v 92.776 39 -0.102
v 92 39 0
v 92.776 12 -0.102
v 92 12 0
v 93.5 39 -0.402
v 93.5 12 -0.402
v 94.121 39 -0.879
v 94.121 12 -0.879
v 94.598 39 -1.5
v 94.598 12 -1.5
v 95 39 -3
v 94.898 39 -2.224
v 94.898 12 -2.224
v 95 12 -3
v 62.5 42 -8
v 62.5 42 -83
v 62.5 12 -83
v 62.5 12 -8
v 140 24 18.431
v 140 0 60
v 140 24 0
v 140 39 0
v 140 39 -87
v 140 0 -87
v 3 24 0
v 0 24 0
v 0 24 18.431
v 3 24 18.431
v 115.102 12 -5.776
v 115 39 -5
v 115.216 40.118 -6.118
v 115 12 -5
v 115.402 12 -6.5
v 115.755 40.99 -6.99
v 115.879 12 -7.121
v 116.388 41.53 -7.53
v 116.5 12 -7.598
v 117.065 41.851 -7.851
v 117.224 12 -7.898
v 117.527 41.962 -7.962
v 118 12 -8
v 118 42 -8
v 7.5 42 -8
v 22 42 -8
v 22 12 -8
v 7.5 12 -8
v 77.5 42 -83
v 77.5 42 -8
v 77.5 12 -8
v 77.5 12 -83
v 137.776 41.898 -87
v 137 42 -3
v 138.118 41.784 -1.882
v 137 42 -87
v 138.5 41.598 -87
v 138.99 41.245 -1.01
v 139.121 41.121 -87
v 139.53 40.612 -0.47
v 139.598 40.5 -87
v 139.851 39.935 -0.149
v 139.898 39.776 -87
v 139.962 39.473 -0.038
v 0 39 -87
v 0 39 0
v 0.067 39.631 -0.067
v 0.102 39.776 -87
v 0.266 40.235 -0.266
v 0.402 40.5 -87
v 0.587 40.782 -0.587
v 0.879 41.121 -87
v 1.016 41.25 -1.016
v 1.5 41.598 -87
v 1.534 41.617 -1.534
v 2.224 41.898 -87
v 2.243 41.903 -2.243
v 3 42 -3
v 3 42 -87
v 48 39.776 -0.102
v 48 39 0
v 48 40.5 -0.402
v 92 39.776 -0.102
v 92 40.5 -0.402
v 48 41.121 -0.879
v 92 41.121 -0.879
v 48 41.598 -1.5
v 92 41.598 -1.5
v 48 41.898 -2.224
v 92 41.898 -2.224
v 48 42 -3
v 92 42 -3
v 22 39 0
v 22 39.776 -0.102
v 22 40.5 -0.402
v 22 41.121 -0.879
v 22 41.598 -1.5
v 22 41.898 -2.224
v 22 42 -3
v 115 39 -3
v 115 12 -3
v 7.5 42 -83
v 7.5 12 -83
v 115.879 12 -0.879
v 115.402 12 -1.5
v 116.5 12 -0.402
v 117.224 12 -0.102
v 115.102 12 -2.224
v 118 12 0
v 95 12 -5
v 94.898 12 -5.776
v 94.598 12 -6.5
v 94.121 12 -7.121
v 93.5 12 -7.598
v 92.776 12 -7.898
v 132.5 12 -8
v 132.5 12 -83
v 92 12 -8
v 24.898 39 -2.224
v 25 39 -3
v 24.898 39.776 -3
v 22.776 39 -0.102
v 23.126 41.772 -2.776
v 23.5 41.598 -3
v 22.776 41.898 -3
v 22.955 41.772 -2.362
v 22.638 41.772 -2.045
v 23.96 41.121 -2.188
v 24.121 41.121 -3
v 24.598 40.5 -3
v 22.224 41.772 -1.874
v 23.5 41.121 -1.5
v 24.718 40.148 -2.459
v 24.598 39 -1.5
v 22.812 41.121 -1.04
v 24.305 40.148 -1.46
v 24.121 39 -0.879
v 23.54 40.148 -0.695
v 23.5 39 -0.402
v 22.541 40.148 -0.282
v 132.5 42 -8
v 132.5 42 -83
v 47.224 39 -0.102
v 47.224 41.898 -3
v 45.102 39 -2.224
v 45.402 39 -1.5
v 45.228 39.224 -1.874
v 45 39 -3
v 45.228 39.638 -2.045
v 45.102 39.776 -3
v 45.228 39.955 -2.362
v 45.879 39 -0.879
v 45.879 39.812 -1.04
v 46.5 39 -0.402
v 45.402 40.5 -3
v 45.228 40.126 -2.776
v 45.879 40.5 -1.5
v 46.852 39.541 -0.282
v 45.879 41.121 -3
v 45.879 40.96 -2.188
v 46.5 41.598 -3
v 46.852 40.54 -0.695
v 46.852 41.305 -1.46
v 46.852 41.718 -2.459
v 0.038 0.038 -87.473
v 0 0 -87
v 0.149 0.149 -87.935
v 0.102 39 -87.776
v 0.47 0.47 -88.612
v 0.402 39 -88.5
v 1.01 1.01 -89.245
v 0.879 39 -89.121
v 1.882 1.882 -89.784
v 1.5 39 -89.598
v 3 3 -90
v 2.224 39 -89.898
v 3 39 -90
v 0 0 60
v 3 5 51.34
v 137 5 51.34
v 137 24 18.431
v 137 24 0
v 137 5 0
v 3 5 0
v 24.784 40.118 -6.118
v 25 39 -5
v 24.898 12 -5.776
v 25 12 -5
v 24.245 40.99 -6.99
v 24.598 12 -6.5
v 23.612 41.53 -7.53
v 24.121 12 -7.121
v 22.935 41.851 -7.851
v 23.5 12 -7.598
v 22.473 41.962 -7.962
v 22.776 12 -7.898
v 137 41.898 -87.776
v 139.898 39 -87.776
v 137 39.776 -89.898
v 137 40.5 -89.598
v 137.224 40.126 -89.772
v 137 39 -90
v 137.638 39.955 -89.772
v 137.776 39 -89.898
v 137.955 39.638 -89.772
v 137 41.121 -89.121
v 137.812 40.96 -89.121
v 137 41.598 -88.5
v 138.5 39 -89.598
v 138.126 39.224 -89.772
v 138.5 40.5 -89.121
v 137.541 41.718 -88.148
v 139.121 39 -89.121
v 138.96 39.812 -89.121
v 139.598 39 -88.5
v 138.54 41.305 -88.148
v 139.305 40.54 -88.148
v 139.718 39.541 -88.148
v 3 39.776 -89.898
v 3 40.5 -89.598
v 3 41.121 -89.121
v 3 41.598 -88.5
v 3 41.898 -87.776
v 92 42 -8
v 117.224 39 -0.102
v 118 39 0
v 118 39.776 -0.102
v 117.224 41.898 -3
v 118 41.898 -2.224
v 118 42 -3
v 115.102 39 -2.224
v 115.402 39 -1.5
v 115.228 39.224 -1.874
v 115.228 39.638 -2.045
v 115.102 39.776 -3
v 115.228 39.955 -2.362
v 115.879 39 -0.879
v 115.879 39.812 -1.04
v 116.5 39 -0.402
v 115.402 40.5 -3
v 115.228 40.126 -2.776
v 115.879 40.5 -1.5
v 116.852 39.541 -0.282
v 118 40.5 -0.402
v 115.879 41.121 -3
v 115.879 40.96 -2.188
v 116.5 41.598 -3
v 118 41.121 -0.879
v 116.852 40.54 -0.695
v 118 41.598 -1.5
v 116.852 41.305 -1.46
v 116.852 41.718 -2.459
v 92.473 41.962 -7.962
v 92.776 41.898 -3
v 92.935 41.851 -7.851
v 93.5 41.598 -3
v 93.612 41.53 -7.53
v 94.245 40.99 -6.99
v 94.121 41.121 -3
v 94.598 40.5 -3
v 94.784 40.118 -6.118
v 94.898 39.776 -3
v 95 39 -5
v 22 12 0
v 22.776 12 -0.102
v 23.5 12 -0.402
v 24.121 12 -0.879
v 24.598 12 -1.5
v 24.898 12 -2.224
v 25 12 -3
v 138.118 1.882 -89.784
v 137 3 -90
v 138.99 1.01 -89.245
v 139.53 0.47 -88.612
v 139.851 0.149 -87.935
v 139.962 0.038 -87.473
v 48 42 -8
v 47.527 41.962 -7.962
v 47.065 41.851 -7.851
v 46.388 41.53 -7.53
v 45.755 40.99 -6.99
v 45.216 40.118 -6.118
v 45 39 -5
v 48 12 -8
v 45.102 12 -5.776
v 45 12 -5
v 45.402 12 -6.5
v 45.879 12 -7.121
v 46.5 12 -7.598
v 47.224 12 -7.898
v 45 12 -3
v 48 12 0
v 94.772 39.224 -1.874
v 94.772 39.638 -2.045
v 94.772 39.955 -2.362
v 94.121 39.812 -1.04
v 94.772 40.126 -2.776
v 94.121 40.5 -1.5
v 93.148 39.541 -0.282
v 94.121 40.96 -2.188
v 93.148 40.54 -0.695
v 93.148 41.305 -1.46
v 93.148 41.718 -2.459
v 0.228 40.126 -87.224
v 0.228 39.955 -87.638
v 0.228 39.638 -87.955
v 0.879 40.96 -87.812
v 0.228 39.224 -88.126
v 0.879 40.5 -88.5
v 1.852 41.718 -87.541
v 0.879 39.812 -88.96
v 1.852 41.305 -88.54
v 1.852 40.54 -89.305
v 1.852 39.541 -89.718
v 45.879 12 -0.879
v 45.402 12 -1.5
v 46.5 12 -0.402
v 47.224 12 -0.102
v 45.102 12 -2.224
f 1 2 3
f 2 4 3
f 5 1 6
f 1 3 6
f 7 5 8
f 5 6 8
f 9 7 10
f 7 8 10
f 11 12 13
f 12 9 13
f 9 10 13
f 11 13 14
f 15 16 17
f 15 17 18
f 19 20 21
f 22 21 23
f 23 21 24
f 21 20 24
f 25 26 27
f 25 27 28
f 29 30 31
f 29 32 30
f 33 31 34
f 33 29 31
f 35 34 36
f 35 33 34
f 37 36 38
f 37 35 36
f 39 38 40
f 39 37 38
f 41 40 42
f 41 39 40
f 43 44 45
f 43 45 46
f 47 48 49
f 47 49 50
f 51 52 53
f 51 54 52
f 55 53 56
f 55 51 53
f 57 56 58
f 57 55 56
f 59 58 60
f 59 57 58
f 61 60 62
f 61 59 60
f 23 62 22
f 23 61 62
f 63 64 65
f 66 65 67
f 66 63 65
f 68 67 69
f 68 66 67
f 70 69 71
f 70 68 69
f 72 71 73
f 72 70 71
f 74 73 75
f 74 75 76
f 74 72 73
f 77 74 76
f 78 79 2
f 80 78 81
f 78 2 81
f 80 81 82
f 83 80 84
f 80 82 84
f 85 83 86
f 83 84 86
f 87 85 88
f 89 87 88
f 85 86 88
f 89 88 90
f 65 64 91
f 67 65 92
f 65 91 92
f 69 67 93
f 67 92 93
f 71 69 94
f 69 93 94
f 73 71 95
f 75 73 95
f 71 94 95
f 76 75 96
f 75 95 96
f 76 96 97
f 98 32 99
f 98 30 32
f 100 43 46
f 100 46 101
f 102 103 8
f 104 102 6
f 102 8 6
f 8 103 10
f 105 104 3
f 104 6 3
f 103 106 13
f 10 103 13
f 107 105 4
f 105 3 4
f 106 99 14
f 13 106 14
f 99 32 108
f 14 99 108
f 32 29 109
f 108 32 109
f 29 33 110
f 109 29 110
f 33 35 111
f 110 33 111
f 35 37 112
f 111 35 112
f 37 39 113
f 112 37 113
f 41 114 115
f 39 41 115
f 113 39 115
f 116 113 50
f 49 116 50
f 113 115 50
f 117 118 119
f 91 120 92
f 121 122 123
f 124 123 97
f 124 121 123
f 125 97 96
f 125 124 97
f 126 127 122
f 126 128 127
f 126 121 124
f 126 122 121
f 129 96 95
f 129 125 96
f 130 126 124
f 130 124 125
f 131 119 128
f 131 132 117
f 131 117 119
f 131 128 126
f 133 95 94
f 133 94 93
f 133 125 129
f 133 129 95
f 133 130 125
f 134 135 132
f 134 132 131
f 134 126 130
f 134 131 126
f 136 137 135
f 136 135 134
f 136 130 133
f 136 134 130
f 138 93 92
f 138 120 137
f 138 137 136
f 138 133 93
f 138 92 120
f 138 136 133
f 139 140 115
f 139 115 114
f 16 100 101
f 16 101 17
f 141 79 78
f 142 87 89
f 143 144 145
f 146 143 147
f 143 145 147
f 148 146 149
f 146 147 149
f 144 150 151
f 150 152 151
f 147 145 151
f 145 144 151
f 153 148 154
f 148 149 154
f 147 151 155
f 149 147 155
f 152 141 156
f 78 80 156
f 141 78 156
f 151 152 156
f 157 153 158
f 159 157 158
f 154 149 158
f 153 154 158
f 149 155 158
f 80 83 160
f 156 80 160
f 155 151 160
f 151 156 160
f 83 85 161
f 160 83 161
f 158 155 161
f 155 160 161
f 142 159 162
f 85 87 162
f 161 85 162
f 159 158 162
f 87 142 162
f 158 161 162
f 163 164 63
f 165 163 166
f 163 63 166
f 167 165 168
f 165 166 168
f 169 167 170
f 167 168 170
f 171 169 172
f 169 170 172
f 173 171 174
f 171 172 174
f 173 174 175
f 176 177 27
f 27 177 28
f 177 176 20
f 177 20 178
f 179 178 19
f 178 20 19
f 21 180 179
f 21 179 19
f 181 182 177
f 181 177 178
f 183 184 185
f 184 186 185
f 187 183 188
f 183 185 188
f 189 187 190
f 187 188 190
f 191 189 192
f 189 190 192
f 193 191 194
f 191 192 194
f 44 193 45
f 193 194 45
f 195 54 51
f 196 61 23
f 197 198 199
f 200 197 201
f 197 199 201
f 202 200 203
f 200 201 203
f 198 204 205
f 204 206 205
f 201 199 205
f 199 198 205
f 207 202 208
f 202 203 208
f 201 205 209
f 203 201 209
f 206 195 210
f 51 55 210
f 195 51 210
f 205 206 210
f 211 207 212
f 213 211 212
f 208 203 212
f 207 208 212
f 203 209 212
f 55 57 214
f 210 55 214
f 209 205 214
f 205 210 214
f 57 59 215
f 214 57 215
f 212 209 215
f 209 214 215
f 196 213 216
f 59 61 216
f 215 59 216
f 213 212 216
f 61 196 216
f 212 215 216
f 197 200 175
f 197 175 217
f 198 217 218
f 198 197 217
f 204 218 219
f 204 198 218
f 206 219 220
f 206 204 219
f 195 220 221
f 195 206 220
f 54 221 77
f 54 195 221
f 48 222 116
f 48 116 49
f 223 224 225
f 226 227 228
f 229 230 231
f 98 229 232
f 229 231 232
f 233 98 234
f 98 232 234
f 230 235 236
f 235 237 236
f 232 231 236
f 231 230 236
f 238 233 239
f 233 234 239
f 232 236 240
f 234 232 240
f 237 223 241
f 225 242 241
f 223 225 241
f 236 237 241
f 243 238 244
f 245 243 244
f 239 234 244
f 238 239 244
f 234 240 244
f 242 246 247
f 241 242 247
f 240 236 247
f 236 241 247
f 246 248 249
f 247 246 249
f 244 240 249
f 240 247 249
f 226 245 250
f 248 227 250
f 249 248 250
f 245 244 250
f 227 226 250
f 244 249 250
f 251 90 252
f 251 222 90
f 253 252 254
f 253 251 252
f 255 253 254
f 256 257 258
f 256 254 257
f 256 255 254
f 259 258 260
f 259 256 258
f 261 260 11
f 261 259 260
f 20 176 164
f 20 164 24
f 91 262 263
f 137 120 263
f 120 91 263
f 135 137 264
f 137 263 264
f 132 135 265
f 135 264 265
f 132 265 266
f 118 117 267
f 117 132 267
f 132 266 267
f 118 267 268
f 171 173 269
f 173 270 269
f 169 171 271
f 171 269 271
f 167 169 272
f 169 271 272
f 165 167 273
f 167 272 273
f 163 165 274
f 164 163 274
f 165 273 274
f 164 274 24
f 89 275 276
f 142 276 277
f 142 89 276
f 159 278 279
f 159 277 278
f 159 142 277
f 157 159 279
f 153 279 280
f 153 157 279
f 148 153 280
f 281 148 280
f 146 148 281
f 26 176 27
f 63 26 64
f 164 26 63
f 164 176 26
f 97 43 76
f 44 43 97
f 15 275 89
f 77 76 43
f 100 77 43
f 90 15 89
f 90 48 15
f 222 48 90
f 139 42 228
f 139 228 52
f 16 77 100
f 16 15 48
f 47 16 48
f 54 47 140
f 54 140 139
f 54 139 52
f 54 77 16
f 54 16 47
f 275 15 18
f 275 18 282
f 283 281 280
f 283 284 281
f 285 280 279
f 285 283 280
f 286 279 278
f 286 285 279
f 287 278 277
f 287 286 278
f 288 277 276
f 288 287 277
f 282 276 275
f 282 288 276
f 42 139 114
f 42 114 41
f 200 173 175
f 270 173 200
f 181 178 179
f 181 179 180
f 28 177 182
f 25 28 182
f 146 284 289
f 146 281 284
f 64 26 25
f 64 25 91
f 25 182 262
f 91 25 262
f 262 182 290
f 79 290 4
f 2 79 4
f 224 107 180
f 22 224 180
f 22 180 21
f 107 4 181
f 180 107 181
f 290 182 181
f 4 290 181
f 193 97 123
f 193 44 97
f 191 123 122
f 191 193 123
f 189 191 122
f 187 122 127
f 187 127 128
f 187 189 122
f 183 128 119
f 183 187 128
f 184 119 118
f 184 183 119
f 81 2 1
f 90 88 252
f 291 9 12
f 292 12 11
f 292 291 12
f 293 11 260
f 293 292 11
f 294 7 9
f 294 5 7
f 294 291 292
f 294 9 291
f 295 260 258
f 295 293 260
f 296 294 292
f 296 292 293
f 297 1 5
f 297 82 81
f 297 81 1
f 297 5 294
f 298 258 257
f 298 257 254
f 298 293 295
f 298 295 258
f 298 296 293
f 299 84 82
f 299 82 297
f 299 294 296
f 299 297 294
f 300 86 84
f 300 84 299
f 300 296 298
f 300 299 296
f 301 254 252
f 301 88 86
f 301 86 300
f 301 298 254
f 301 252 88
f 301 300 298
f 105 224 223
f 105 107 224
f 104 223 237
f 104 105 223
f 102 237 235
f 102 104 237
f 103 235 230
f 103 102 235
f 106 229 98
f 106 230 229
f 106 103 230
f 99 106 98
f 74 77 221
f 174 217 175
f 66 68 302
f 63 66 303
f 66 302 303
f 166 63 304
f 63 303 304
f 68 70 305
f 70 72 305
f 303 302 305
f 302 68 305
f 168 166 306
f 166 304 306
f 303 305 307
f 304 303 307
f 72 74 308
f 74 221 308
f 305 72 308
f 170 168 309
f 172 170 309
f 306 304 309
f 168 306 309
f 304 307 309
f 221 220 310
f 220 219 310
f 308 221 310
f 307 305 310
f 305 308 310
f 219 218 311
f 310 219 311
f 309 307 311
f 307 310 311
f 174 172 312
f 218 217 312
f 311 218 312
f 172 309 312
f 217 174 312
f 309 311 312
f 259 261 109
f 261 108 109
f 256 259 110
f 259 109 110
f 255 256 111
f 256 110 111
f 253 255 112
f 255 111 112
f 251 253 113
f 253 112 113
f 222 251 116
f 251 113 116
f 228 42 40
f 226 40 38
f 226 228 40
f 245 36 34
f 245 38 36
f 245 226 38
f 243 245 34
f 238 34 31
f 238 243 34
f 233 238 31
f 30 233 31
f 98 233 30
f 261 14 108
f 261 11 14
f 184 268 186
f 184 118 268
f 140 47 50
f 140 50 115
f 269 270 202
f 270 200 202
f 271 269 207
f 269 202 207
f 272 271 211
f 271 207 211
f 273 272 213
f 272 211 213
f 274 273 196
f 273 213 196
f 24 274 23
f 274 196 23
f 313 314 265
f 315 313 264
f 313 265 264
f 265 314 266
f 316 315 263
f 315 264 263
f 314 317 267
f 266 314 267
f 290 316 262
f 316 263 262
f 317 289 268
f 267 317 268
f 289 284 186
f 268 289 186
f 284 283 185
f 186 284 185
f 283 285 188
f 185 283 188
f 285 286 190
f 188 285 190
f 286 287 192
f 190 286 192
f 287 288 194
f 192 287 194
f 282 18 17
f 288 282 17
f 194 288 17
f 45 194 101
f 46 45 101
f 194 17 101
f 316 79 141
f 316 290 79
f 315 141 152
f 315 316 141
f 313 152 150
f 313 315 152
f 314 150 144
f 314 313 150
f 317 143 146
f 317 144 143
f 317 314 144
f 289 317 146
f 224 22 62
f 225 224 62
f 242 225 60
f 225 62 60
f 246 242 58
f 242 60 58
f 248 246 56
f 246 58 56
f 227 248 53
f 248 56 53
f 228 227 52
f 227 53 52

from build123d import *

# Parameters (mm, degrees)
SKETCH1_W               = 140
SKETCH1_H               = 90
BOSS_EXTRUDE1_DEPTH     = 42
CUT_EXTRUDE1_DEPTH      = 30
FILLET2_R               = 3
SKETCH3_W               = 140
SKETCH3_H               = 60
BOSS_EXTRUDE2_DEPTH     = 5
SKETCH4_W               = 3
SKETCH4_H               = 60
BOSS_EXTRUDE3_DEPTH     = 19
CUT_EXTRUDE2_DEPTH      = 172.650808329
CUT_EXTRUDE2_DEPTH_BACK = 172.650808329


with BuildPart() as part:
    # Sketch1 → Boss-Extrude1 (new body)
    with BuildSketch(Plane(origin=(0, 0, 0), x_dir=(1, 0, 0), z_dir=(0, 1, 0))):
        with Locations((70, 45)):
            Rectangle(SKETCH1_W, SKETCH1_H)
    extrude(amount=BOSS_EXTRUDE1_DEPTH)

    # Sketch2 → Cut-Extrude1 (cut)
    with BuildSketch(Plane(origin=(0, 42, 0), x_dir=(1, 0, 0), z_dir=(0, 1, 0))):
        Polygon((7.5, 8), (7.5, 83), (62.5, 83), (62.5, 8), (45, 8), (45, 0), (25, 0), (25, 8), align=None)
        Polygon((77.5, 8), (77.5, 83), (132.5, 83), (132.5, 8), (115, 8), (115, 0), (95, 0), (95, 8), align=None)
    extrude(amount=-CUT_EXTRUDE1_DEPTH, mode=Mode.SUBTRACT)

    # Fillet2
    fillet2_edges = [part.edges().sort_by_distance(p)[0] for p in [
        (140, 42, -45),
        (70, 42, 0),
        (127.5, 42, 0),
        (70, 42, -90),
        (25, 27, -8),
        (45, 27, -8),
        (45, 27, 0),
        (25, 27, 0),
        (25, 42, -4),
        (45, 42, -4),
        (95, 27, -8),
        (115, 27, -8),
        (115, 27, 0),
        (95, 27, 0),
        (95, 42, -4),
        (115, 42, -4),
        (0, 42, -45),
        (70, 0, -90),
        (0, 21, -90),
        (140, 21, -90),
        (12.5, 42, 0),
    ]]
    fillet(fillet2_edges, radius=FILLET2_R)

    # Sketch3 → Boss-Extrude2 (add)
    with BuildSketch(Plane(origin=(0, 0, 0), x_dir=(1, 0, 0), z_dir=(0, 1, 0))):
        with Locations((70, -30)):
            Rectangle(SKETCH3_W, SKETCH3_H)
    extrude(amount=BOSS_EXTRUDE2_DEPTH)

    # Sketch4 → Boss-Extrude3 (add)
    with BuildSketch(Plane(origin=(0, 5, 0), x_dir=(1, 0, 0), z_dir=(0, 1, 0))):
        with Locations((1.5, -30)):
            Rectangle(SKETCH4_W, SKETCH4_H)
        with Locations((138.5, -30)):
            Rectangle(SKETCH4_W, SKETCH4_H)
    extrude(amount=BOSS_EXTRUDE3_DEPTH)

    # Sketch5 → Cut-Extrude2 (cut, two sides: drawn at the far end of the back side and taken through both)
    with BuildSketch(Plane.ZY.offset(-CUT_EXTRUDE2_DEPTH_BACK)):
        Polygon((60, 0), (8.038475773, 30), (60, 30), align=None)
    extrude(amount=CUT_EXTRUDE2_DEPTH + CUT_EXTRUDE2_DEPTH_BACK, mode=Mode.SUBTRACT)


solid = part.part
